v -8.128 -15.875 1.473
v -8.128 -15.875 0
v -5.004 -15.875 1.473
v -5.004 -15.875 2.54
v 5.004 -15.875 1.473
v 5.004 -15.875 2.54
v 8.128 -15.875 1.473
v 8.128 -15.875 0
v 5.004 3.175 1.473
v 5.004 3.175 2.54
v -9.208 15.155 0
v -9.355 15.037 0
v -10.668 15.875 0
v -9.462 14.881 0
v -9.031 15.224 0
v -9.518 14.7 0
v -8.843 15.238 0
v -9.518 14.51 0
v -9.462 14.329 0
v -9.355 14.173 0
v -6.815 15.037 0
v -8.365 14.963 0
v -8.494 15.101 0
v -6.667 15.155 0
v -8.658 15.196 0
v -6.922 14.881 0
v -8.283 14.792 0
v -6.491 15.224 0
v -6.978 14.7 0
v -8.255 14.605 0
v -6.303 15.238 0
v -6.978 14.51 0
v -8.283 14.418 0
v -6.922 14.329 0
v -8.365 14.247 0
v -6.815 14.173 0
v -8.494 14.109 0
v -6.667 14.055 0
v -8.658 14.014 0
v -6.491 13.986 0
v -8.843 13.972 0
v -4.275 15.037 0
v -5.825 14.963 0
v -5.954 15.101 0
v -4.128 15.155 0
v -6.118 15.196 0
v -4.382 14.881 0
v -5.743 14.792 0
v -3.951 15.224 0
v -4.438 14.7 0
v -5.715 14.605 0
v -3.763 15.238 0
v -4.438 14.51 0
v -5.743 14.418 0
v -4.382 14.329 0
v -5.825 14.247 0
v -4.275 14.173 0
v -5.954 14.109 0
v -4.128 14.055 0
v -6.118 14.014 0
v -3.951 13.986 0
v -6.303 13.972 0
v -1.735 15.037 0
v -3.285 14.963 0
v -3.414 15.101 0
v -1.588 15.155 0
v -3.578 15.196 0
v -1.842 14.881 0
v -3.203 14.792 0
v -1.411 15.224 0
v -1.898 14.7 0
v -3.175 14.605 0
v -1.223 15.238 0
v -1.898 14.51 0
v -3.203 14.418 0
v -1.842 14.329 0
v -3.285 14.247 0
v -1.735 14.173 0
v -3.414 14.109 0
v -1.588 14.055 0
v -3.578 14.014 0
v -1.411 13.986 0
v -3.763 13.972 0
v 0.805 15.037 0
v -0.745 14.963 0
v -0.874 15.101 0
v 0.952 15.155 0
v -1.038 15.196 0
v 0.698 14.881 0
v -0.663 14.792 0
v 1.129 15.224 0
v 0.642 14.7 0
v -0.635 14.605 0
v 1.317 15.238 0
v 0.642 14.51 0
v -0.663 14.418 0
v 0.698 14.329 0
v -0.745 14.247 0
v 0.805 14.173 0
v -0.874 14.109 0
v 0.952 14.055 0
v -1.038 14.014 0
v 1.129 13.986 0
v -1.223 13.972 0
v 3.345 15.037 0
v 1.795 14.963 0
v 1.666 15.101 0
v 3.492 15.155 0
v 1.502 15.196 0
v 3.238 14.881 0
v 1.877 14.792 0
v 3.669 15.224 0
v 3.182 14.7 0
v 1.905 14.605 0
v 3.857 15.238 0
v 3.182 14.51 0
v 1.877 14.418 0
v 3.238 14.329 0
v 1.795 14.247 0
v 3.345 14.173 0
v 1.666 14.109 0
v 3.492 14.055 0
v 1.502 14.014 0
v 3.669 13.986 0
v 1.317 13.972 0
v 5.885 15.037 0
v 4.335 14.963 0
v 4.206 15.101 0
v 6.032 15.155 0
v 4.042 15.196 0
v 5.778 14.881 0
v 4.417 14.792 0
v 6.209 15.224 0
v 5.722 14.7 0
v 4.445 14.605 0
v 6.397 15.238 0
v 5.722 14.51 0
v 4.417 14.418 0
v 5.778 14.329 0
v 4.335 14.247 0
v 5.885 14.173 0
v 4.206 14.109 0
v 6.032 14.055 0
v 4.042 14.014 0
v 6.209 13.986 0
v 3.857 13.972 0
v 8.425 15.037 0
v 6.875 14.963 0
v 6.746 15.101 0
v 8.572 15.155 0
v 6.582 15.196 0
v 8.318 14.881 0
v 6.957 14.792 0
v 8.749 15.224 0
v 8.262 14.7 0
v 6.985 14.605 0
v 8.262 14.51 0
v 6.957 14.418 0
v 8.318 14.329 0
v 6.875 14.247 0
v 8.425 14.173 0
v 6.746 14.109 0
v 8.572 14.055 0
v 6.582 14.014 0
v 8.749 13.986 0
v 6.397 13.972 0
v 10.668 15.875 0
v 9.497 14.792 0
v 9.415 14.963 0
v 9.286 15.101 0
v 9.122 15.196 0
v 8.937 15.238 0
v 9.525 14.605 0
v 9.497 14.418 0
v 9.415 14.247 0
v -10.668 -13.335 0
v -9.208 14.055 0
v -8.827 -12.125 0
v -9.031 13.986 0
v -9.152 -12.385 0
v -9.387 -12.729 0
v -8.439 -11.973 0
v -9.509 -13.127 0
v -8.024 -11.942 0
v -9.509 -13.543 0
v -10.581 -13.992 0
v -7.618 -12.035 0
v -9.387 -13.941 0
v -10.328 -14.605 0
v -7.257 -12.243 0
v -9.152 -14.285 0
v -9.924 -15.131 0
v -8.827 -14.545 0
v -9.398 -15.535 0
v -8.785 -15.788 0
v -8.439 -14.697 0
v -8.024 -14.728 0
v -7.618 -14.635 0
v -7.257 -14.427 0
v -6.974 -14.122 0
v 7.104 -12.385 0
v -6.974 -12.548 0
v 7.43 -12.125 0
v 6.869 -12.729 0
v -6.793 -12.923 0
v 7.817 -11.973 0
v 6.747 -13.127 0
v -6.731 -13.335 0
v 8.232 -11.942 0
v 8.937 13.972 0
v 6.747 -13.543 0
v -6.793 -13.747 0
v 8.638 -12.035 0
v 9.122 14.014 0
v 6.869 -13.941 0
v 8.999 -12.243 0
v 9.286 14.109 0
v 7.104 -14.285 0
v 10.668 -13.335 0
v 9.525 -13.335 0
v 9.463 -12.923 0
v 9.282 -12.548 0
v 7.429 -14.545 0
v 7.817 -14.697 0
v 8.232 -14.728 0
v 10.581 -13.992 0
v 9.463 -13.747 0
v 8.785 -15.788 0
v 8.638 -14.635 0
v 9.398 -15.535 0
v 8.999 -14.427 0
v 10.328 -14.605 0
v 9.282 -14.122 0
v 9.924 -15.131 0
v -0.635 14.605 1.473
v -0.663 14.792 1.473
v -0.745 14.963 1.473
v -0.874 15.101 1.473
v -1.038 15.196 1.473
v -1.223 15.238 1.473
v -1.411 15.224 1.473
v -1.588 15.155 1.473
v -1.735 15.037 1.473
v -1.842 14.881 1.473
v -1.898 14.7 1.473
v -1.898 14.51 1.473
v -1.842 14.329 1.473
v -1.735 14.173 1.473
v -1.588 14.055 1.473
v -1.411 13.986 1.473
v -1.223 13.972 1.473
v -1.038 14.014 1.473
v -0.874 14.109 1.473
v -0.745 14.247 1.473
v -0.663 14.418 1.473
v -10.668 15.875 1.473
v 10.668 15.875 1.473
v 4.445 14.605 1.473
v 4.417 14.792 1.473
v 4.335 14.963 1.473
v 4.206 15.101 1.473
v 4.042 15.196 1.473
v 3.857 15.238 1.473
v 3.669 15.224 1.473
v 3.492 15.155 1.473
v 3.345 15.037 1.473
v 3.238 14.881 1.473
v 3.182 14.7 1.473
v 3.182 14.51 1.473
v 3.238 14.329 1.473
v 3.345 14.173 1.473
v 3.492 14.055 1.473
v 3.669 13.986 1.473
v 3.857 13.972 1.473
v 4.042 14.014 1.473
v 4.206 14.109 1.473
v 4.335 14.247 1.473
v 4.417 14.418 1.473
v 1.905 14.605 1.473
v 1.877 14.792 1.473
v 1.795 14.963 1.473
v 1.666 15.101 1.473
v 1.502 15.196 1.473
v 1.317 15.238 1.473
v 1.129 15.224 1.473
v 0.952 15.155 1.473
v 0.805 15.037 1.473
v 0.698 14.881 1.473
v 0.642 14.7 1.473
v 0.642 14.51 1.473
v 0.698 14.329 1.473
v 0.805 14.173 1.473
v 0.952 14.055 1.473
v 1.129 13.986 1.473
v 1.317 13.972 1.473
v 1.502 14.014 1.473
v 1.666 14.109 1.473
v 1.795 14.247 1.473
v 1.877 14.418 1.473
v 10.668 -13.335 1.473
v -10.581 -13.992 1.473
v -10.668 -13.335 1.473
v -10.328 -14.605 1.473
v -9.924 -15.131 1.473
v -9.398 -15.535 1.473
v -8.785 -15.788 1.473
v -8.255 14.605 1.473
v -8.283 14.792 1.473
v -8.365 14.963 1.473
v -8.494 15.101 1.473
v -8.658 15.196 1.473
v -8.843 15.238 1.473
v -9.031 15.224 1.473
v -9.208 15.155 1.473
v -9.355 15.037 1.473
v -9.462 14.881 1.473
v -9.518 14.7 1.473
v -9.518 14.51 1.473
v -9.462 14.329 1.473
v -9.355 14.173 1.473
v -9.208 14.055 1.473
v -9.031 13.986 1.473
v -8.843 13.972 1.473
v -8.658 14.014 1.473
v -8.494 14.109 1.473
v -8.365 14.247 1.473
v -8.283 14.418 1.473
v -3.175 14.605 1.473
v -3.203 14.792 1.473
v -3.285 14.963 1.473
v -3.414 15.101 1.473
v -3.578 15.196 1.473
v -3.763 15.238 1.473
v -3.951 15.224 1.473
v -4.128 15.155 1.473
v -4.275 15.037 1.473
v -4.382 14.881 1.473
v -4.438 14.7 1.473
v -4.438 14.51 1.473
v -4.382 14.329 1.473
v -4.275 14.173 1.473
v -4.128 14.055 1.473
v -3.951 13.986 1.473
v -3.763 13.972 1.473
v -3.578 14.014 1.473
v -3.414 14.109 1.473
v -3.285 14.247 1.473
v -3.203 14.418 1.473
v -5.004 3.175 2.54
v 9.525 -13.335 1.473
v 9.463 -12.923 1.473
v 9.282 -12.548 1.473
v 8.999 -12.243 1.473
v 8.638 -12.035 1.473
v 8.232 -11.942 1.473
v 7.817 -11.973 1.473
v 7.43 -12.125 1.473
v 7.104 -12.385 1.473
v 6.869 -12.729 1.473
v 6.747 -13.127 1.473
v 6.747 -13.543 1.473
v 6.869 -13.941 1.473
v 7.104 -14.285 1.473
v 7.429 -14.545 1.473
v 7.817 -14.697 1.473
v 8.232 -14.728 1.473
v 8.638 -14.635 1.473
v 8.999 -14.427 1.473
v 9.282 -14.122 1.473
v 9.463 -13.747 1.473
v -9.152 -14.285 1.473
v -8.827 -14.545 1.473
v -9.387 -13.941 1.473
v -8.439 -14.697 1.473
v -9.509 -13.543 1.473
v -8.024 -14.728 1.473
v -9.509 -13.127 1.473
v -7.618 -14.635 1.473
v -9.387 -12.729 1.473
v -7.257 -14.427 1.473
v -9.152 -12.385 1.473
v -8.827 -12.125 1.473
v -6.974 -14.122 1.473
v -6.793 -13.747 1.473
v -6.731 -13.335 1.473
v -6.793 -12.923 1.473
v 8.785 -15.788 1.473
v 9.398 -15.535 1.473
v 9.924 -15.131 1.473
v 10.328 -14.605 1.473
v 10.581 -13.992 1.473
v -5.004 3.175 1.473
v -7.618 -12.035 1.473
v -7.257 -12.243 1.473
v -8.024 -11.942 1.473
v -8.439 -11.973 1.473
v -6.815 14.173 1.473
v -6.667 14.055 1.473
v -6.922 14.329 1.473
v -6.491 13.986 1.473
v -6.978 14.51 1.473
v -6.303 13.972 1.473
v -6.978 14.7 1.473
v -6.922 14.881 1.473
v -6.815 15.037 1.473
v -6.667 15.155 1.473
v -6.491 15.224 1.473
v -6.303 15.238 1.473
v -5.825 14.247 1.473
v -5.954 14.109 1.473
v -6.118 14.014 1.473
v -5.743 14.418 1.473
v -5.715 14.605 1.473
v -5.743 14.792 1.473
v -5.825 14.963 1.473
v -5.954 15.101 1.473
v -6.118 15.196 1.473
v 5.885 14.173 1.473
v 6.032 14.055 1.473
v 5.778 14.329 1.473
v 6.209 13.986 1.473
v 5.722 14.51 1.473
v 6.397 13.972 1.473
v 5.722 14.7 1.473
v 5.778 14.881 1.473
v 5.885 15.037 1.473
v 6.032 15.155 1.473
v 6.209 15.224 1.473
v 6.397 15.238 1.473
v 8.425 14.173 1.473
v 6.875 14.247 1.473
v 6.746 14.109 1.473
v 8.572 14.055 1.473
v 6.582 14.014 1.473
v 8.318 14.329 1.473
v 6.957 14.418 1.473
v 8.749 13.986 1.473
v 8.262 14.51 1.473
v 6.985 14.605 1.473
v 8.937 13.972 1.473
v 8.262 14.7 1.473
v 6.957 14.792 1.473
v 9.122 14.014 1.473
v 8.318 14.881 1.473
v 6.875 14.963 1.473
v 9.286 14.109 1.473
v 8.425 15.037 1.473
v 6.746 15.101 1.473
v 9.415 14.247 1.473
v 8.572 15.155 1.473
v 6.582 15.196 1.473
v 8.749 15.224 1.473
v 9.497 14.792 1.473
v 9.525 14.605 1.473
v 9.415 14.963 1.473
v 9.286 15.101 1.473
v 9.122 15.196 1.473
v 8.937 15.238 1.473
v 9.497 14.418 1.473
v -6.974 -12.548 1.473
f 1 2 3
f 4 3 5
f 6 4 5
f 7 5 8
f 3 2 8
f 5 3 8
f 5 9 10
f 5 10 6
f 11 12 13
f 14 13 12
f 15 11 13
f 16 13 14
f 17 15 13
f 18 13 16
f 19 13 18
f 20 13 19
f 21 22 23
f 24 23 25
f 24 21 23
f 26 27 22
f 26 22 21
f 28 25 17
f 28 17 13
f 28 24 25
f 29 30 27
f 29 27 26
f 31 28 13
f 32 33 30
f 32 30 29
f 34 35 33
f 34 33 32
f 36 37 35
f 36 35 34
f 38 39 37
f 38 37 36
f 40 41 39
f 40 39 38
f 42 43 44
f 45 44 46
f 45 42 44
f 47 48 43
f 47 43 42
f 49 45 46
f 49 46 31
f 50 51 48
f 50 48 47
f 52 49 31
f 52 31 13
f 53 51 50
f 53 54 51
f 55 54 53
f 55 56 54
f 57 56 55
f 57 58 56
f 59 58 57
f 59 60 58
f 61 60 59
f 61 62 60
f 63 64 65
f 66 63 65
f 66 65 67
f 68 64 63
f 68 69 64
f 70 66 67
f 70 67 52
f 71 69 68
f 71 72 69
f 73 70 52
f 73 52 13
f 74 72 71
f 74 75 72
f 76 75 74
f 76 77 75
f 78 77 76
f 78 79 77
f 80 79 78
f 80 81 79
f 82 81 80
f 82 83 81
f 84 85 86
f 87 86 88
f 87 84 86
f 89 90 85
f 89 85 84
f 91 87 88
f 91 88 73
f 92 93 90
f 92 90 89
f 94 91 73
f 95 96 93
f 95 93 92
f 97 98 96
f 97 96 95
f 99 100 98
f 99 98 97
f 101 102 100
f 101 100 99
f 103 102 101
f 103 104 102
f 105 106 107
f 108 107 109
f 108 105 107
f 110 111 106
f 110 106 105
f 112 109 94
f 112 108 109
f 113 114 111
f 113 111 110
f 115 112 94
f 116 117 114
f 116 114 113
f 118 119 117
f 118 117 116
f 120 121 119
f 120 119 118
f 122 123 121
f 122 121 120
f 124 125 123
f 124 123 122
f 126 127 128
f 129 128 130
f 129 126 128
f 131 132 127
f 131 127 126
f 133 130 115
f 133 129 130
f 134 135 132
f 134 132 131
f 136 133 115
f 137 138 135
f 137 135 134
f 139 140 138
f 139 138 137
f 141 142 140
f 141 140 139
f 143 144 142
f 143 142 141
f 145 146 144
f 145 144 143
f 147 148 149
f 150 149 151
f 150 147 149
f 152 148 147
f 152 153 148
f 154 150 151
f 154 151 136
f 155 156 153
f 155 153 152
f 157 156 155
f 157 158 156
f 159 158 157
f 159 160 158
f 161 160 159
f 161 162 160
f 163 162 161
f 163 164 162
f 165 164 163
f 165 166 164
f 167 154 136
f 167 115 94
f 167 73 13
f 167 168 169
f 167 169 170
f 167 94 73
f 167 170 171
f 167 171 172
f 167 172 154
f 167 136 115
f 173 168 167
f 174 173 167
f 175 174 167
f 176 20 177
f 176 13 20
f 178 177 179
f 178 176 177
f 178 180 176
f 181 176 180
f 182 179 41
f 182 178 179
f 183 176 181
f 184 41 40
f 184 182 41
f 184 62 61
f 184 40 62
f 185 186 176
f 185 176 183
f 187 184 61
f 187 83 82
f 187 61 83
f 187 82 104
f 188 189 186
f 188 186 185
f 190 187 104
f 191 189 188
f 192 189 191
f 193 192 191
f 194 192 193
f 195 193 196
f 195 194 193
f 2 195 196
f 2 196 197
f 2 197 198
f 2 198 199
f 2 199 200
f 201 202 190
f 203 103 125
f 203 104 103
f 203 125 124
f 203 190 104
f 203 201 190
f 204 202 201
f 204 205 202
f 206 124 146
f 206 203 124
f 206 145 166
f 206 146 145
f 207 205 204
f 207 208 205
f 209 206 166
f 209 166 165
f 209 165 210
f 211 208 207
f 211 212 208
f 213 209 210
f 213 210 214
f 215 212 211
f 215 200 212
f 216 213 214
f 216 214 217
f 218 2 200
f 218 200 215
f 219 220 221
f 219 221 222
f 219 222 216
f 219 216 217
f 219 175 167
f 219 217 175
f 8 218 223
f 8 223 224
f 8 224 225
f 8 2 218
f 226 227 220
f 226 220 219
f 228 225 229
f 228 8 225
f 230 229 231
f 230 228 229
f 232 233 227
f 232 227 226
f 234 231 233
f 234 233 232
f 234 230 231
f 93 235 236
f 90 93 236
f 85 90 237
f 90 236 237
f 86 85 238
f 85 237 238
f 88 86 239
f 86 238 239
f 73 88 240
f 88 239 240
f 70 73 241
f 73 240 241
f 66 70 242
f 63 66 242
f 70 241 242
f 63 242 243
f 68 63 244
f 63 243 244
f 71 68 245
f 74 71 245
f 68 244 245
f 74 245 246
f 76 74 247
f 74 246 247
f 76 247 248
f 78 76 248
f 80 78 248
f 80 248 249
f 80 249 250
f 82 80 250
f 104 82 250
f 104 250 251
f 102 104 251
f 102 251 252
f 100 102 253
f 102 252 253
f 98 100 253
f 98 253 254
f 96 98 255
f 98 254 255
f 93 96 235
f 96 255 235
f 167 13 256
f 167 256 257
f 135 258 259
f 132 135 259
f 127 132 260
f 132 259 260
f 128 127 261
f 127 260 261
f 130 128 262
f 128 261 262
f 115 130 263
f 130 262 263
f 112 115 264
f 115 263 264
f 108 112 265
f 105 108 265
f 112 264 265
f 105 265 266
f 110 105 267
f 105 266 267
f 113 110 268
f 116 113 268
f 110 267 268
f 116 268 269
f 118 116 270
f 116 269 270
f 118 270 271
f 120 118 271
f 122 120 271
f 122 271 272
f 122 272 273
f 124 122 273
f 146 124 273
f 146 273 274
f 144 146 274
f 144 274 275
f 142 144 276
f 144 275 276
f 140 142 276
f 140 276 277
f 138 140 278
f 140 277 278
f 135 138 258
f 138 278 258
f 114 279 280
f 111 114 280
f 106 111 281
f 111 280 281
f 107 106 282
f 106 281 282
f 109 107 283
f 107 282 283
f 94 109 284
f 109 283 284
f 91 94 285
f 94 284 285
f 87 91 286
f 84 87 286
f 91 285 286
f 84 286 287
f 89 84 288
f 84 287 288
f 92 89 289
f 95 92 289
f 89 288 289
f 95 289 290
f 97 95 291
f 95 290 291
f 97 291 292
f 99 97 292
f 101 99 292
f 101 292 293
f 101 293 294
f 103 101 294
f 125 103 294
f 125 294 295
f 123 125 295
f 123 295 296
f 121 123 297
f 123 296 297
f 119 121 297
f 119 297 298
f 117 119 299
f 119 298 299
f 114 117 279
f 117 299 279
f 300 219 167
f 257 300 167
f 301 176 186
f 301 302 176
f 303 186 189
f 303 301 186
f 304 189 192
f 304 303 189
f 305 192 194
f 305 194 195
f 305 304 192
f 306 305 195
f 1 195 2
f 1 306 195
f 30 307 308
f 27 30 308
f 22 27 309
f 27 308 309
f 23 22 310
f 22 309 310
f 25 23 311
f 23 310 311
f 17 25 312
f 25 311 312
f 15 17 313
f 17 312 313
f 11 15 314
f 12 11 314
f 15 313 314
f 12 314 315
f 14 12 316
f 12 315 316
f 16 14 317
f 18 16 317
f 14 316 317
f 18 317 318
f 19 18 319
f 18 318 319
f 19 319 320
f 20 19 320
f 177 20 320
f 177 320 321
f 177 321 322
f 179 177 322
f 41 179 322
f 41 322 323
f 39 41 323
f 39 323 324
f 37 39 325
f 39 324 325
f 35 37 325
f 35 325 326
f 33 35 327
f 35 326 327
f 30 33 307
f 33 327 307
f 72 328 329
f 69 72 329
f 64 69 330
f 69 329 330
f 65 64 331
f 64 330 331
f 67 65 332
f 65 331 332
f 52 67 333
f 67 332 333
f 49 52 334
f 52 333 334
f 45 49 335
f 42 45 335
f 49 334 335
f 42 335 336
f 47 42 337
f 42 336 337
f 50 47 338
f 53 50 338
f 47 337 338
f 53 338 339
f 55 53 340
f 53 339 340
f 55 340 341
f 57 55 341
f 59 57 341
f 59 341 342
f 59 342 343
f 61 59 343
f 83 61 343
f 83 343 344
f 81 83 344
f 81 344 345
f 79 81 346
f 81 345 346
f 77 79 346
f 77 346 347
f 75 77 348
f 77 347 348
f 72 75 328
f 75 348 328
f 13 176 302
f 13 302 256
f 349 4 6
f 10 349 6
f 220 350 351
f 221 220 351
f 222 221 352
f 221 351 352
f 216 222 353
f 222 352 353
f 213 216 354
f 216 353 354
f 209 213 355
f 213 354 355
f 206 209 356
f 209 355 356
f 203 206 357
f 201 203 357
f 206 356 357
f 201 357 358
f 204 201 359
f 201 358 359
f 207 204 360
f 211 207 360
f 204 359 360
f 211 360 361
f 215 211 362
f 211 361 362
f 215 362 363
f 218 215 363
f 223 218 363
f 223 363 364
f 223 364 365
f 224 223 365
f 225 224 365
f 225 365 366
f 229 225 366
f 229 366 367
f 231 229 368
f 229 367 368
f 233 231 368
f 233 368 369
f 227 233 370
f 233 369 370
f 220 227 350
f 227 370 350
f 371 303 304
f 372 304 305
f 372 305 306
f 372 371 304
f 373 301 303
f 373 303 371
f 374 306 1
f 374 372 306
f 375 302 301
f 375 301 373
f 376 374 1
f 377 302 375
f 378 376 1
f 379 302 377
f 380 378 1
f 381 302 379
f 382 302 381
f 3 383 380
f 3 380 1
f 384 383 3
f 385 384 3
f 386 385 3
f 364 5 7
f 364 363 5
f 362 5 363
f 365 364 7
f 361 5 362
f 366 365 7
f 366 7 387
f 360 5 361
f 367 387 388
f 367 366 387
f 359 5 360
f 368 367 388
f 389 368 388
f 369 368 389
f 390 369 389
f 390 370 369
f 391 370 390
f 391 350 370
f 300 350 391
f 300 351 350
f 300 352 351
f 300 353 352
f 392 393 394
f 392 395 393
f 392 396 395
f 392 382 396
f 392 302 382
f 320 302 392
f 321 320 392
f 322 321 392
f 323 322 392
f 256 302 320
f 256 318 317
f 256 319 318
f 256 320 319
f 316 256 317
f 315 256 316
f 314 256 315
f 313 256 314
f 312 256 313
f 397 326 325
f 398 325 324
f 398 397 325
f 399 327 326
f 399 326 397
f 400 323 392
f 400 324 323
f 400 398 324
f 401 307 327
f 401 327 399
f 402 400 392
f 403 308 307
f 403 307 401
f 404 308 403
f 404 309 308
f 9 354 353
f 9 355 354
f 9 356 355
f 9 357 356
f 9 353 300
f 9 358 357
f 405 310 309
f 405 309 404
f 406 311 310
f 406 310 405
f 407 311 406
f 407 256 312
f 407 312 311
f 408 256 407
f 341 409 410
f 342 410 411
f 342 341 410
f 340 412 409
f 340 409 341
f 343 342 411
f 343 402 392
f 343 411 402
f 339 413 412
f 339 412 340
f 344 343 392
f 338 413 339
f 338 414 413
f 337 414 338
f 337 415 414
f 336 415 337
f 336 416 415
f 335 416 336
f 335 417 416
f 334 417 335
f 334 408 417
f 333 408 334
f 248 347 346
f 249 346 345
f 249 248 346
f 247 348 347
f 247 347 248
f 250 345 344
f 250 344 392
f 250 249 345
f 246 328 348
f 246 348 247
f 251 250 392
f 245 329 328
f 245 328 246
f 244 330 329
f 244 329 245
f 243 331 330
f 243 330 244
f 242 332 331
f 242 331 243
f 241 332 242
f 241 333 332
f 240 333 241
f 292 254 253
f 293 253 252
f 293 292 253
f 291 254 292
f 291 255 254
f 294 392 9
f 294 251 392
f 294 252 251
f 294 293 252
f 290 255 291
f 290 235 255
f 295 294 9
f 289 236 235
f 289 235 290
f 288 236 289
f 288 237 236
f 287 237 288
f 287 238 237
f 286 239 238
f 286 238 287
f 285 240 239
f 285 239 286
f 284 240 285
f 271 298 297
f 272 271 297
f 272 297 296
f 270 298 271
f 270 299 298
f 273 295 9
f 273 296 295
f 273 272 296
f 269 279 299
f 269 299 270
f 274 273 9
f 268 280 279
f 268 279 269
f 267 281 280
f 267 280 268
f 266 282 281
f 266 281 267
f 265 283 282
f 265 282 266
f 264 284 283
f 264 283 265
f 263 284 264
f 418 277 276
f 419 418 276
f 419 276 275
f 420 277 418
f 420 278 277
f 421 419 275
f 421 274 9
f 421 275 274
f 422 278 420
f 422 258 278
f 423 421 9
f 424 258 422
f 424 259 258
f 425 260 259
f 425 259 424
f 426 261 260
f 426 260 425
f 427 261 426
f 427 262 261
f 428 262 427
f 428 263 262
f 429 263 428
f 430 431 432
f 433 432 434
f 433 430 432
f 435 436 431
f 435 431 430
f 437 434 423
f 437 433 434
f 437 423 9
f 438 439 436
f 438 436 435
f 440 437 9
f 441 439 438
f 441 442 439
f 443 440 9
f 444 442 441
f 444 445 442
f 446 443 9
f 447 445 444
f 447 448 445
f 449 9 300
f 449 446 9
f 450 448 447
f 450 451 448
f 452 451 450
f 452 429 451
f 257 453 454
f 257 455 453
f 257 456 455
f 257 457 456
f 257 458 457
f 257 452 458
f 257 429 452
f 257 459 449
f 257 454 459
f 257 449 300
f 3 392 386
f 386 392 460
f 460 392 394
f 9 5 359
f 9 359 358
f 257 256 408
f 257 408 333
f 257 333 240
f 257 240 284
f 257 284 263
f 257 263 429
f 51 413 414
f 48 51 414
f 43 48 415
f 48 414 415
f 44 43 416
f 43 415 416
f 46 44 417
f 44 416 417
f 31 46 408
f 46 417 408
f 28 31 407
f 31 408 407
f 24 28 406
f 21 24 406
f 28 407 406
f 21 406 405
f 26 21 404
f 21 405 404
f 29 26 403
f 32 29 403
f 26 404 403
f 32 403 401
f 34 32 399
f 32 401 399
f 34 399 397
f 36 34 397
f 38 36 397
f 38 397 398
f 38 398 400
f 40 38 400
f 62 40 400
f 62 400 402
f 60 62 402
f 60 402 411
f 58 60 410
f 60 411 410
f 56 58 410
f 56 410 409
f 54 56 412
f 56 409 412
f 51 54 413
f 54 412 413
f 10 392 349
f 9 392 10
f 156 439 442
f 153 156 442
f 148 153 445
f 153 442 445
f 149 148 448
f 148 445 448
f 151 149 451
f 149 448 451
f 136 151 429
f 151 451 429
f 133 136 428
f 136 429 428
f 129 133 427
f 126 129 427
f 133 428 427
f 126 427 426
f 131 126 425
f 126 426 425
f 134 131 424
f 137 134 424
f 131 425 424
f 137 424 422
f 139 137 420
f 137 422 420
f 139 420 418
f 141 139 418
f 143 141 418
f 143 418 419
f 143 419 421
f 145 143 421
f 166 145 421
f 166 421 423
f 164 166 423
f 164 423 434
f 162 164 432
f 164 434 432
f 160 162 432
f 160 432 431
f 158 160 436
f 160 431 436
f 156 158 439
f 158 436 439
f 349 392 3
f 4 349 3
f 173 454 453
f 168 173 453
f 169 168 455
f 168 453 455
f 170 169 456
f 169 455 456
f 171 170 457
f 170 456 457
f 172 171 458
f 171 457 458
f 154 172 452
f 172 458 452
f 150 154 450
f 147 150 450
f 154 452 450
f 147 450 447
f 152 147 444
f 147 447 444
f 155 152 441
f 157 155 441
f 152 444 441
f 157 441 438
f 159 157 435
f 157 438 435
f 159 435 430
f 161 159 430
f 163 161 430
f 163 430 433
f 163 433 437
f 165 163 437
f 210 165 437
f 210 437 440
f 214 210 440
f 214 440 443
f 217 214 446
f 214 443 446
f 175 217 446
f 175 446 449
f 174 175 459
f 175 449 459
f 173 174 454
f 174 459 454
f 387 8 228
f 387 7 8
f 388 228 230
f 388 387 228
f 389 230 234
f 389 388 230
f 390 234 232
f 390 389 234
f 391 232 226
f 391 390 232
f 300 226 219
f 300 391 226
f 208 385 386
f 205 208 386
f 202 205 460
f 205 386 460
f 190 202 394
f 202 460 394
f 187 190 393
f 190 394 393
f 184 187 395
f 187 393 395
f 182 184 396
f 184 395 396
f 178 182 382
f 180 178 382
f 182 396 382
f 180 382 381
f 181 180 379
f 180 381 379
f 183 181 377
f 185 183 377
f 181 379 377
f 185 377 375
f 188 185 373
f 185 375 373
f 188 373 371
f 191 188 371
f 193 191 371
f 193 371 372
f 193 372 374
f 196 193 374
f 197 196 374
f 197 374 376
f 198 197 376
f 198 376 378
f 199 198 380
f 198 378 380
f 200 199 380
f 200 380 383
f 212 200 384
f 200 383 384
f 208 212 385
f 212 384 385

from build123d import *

# Parameters (mm, degrees)
F0_W     = 21.336
F0_H     = 31.75
F1_DEPTH = 1.4732
F2_R     = 2.54
F3_R     = 1.397
F4_DEPTH = 1.4732
F5_R     = 0.635
F6_DEPTH = 1.4732
F7_W     = 10.0076
F7_H     = 19.05
F8_DEPTH = 2.54


with BuildPart() as f1:
    # F0 (on Top) → F1 (new body)
    with BuildSketch(Plane.XY):
        Rectangle(F0_W, F0_H)
    extrude(amount=F1_DEPTH)

    # F2
    f2_edges = [f1.edges().sort_by_distance(p)[0] for p in [
        (10.668, -15.875, 0.7366),
        (-10.668, -15.875, 0.7366),
    ]]
    fillet(f2_edges, radius=F2_R)

    # F3 (on face) → F4 (cut, through all)
    with BuildSketch(Plane.XY.offset(1.4732)):
        with Locations((8.128, -13.335)):
            Circle(F3_R)
        with Locations((-8.128, -13.335)):
            Circle(F3_R)
    extrude(amount=-F4_DEPTH, mode=Mode.SUBTRACT)

    # F5 (on face) → F6 (cut, through all)
    with BuildSketch(Plane.XY.offset(1.4732)):
        with Locations((-8.89, 14.605)):
            Circle(F5_R)
        with Locations((-6.35, 14.605)):
            Circle(F5_R)
        with Locations((-3.81, 14.605)):
            Circle(F5_R)
        with Locations((-1.27, 14.605)):
            Circle(F5_R)
        with Locations((1.27, 14.605)):
            Circle(F5_R)
        with Locations((3.81, 14.605)):
            Circle(F5_R)
        with Locations((6.35, 14.605)):
            Circle(F5_R)
        with Locations((8.89, 14.605)):
            Circle(F5_R)
    extrude(amount=-F6_DEPTH, mode=Mode.SUBTRACT)

    # F7 (on face) → F8 (join)
    with BuildSketch(Plane(origin=(0, 0, 0), x_dir=(1, 0, 0), z_dir=(0, 0, -1))):
        with Locations((0, 6.35)):
            Rectangle(F7_W, F7_H)
    extrude(amount=-F8_DEPTH)


solid = f1.part
